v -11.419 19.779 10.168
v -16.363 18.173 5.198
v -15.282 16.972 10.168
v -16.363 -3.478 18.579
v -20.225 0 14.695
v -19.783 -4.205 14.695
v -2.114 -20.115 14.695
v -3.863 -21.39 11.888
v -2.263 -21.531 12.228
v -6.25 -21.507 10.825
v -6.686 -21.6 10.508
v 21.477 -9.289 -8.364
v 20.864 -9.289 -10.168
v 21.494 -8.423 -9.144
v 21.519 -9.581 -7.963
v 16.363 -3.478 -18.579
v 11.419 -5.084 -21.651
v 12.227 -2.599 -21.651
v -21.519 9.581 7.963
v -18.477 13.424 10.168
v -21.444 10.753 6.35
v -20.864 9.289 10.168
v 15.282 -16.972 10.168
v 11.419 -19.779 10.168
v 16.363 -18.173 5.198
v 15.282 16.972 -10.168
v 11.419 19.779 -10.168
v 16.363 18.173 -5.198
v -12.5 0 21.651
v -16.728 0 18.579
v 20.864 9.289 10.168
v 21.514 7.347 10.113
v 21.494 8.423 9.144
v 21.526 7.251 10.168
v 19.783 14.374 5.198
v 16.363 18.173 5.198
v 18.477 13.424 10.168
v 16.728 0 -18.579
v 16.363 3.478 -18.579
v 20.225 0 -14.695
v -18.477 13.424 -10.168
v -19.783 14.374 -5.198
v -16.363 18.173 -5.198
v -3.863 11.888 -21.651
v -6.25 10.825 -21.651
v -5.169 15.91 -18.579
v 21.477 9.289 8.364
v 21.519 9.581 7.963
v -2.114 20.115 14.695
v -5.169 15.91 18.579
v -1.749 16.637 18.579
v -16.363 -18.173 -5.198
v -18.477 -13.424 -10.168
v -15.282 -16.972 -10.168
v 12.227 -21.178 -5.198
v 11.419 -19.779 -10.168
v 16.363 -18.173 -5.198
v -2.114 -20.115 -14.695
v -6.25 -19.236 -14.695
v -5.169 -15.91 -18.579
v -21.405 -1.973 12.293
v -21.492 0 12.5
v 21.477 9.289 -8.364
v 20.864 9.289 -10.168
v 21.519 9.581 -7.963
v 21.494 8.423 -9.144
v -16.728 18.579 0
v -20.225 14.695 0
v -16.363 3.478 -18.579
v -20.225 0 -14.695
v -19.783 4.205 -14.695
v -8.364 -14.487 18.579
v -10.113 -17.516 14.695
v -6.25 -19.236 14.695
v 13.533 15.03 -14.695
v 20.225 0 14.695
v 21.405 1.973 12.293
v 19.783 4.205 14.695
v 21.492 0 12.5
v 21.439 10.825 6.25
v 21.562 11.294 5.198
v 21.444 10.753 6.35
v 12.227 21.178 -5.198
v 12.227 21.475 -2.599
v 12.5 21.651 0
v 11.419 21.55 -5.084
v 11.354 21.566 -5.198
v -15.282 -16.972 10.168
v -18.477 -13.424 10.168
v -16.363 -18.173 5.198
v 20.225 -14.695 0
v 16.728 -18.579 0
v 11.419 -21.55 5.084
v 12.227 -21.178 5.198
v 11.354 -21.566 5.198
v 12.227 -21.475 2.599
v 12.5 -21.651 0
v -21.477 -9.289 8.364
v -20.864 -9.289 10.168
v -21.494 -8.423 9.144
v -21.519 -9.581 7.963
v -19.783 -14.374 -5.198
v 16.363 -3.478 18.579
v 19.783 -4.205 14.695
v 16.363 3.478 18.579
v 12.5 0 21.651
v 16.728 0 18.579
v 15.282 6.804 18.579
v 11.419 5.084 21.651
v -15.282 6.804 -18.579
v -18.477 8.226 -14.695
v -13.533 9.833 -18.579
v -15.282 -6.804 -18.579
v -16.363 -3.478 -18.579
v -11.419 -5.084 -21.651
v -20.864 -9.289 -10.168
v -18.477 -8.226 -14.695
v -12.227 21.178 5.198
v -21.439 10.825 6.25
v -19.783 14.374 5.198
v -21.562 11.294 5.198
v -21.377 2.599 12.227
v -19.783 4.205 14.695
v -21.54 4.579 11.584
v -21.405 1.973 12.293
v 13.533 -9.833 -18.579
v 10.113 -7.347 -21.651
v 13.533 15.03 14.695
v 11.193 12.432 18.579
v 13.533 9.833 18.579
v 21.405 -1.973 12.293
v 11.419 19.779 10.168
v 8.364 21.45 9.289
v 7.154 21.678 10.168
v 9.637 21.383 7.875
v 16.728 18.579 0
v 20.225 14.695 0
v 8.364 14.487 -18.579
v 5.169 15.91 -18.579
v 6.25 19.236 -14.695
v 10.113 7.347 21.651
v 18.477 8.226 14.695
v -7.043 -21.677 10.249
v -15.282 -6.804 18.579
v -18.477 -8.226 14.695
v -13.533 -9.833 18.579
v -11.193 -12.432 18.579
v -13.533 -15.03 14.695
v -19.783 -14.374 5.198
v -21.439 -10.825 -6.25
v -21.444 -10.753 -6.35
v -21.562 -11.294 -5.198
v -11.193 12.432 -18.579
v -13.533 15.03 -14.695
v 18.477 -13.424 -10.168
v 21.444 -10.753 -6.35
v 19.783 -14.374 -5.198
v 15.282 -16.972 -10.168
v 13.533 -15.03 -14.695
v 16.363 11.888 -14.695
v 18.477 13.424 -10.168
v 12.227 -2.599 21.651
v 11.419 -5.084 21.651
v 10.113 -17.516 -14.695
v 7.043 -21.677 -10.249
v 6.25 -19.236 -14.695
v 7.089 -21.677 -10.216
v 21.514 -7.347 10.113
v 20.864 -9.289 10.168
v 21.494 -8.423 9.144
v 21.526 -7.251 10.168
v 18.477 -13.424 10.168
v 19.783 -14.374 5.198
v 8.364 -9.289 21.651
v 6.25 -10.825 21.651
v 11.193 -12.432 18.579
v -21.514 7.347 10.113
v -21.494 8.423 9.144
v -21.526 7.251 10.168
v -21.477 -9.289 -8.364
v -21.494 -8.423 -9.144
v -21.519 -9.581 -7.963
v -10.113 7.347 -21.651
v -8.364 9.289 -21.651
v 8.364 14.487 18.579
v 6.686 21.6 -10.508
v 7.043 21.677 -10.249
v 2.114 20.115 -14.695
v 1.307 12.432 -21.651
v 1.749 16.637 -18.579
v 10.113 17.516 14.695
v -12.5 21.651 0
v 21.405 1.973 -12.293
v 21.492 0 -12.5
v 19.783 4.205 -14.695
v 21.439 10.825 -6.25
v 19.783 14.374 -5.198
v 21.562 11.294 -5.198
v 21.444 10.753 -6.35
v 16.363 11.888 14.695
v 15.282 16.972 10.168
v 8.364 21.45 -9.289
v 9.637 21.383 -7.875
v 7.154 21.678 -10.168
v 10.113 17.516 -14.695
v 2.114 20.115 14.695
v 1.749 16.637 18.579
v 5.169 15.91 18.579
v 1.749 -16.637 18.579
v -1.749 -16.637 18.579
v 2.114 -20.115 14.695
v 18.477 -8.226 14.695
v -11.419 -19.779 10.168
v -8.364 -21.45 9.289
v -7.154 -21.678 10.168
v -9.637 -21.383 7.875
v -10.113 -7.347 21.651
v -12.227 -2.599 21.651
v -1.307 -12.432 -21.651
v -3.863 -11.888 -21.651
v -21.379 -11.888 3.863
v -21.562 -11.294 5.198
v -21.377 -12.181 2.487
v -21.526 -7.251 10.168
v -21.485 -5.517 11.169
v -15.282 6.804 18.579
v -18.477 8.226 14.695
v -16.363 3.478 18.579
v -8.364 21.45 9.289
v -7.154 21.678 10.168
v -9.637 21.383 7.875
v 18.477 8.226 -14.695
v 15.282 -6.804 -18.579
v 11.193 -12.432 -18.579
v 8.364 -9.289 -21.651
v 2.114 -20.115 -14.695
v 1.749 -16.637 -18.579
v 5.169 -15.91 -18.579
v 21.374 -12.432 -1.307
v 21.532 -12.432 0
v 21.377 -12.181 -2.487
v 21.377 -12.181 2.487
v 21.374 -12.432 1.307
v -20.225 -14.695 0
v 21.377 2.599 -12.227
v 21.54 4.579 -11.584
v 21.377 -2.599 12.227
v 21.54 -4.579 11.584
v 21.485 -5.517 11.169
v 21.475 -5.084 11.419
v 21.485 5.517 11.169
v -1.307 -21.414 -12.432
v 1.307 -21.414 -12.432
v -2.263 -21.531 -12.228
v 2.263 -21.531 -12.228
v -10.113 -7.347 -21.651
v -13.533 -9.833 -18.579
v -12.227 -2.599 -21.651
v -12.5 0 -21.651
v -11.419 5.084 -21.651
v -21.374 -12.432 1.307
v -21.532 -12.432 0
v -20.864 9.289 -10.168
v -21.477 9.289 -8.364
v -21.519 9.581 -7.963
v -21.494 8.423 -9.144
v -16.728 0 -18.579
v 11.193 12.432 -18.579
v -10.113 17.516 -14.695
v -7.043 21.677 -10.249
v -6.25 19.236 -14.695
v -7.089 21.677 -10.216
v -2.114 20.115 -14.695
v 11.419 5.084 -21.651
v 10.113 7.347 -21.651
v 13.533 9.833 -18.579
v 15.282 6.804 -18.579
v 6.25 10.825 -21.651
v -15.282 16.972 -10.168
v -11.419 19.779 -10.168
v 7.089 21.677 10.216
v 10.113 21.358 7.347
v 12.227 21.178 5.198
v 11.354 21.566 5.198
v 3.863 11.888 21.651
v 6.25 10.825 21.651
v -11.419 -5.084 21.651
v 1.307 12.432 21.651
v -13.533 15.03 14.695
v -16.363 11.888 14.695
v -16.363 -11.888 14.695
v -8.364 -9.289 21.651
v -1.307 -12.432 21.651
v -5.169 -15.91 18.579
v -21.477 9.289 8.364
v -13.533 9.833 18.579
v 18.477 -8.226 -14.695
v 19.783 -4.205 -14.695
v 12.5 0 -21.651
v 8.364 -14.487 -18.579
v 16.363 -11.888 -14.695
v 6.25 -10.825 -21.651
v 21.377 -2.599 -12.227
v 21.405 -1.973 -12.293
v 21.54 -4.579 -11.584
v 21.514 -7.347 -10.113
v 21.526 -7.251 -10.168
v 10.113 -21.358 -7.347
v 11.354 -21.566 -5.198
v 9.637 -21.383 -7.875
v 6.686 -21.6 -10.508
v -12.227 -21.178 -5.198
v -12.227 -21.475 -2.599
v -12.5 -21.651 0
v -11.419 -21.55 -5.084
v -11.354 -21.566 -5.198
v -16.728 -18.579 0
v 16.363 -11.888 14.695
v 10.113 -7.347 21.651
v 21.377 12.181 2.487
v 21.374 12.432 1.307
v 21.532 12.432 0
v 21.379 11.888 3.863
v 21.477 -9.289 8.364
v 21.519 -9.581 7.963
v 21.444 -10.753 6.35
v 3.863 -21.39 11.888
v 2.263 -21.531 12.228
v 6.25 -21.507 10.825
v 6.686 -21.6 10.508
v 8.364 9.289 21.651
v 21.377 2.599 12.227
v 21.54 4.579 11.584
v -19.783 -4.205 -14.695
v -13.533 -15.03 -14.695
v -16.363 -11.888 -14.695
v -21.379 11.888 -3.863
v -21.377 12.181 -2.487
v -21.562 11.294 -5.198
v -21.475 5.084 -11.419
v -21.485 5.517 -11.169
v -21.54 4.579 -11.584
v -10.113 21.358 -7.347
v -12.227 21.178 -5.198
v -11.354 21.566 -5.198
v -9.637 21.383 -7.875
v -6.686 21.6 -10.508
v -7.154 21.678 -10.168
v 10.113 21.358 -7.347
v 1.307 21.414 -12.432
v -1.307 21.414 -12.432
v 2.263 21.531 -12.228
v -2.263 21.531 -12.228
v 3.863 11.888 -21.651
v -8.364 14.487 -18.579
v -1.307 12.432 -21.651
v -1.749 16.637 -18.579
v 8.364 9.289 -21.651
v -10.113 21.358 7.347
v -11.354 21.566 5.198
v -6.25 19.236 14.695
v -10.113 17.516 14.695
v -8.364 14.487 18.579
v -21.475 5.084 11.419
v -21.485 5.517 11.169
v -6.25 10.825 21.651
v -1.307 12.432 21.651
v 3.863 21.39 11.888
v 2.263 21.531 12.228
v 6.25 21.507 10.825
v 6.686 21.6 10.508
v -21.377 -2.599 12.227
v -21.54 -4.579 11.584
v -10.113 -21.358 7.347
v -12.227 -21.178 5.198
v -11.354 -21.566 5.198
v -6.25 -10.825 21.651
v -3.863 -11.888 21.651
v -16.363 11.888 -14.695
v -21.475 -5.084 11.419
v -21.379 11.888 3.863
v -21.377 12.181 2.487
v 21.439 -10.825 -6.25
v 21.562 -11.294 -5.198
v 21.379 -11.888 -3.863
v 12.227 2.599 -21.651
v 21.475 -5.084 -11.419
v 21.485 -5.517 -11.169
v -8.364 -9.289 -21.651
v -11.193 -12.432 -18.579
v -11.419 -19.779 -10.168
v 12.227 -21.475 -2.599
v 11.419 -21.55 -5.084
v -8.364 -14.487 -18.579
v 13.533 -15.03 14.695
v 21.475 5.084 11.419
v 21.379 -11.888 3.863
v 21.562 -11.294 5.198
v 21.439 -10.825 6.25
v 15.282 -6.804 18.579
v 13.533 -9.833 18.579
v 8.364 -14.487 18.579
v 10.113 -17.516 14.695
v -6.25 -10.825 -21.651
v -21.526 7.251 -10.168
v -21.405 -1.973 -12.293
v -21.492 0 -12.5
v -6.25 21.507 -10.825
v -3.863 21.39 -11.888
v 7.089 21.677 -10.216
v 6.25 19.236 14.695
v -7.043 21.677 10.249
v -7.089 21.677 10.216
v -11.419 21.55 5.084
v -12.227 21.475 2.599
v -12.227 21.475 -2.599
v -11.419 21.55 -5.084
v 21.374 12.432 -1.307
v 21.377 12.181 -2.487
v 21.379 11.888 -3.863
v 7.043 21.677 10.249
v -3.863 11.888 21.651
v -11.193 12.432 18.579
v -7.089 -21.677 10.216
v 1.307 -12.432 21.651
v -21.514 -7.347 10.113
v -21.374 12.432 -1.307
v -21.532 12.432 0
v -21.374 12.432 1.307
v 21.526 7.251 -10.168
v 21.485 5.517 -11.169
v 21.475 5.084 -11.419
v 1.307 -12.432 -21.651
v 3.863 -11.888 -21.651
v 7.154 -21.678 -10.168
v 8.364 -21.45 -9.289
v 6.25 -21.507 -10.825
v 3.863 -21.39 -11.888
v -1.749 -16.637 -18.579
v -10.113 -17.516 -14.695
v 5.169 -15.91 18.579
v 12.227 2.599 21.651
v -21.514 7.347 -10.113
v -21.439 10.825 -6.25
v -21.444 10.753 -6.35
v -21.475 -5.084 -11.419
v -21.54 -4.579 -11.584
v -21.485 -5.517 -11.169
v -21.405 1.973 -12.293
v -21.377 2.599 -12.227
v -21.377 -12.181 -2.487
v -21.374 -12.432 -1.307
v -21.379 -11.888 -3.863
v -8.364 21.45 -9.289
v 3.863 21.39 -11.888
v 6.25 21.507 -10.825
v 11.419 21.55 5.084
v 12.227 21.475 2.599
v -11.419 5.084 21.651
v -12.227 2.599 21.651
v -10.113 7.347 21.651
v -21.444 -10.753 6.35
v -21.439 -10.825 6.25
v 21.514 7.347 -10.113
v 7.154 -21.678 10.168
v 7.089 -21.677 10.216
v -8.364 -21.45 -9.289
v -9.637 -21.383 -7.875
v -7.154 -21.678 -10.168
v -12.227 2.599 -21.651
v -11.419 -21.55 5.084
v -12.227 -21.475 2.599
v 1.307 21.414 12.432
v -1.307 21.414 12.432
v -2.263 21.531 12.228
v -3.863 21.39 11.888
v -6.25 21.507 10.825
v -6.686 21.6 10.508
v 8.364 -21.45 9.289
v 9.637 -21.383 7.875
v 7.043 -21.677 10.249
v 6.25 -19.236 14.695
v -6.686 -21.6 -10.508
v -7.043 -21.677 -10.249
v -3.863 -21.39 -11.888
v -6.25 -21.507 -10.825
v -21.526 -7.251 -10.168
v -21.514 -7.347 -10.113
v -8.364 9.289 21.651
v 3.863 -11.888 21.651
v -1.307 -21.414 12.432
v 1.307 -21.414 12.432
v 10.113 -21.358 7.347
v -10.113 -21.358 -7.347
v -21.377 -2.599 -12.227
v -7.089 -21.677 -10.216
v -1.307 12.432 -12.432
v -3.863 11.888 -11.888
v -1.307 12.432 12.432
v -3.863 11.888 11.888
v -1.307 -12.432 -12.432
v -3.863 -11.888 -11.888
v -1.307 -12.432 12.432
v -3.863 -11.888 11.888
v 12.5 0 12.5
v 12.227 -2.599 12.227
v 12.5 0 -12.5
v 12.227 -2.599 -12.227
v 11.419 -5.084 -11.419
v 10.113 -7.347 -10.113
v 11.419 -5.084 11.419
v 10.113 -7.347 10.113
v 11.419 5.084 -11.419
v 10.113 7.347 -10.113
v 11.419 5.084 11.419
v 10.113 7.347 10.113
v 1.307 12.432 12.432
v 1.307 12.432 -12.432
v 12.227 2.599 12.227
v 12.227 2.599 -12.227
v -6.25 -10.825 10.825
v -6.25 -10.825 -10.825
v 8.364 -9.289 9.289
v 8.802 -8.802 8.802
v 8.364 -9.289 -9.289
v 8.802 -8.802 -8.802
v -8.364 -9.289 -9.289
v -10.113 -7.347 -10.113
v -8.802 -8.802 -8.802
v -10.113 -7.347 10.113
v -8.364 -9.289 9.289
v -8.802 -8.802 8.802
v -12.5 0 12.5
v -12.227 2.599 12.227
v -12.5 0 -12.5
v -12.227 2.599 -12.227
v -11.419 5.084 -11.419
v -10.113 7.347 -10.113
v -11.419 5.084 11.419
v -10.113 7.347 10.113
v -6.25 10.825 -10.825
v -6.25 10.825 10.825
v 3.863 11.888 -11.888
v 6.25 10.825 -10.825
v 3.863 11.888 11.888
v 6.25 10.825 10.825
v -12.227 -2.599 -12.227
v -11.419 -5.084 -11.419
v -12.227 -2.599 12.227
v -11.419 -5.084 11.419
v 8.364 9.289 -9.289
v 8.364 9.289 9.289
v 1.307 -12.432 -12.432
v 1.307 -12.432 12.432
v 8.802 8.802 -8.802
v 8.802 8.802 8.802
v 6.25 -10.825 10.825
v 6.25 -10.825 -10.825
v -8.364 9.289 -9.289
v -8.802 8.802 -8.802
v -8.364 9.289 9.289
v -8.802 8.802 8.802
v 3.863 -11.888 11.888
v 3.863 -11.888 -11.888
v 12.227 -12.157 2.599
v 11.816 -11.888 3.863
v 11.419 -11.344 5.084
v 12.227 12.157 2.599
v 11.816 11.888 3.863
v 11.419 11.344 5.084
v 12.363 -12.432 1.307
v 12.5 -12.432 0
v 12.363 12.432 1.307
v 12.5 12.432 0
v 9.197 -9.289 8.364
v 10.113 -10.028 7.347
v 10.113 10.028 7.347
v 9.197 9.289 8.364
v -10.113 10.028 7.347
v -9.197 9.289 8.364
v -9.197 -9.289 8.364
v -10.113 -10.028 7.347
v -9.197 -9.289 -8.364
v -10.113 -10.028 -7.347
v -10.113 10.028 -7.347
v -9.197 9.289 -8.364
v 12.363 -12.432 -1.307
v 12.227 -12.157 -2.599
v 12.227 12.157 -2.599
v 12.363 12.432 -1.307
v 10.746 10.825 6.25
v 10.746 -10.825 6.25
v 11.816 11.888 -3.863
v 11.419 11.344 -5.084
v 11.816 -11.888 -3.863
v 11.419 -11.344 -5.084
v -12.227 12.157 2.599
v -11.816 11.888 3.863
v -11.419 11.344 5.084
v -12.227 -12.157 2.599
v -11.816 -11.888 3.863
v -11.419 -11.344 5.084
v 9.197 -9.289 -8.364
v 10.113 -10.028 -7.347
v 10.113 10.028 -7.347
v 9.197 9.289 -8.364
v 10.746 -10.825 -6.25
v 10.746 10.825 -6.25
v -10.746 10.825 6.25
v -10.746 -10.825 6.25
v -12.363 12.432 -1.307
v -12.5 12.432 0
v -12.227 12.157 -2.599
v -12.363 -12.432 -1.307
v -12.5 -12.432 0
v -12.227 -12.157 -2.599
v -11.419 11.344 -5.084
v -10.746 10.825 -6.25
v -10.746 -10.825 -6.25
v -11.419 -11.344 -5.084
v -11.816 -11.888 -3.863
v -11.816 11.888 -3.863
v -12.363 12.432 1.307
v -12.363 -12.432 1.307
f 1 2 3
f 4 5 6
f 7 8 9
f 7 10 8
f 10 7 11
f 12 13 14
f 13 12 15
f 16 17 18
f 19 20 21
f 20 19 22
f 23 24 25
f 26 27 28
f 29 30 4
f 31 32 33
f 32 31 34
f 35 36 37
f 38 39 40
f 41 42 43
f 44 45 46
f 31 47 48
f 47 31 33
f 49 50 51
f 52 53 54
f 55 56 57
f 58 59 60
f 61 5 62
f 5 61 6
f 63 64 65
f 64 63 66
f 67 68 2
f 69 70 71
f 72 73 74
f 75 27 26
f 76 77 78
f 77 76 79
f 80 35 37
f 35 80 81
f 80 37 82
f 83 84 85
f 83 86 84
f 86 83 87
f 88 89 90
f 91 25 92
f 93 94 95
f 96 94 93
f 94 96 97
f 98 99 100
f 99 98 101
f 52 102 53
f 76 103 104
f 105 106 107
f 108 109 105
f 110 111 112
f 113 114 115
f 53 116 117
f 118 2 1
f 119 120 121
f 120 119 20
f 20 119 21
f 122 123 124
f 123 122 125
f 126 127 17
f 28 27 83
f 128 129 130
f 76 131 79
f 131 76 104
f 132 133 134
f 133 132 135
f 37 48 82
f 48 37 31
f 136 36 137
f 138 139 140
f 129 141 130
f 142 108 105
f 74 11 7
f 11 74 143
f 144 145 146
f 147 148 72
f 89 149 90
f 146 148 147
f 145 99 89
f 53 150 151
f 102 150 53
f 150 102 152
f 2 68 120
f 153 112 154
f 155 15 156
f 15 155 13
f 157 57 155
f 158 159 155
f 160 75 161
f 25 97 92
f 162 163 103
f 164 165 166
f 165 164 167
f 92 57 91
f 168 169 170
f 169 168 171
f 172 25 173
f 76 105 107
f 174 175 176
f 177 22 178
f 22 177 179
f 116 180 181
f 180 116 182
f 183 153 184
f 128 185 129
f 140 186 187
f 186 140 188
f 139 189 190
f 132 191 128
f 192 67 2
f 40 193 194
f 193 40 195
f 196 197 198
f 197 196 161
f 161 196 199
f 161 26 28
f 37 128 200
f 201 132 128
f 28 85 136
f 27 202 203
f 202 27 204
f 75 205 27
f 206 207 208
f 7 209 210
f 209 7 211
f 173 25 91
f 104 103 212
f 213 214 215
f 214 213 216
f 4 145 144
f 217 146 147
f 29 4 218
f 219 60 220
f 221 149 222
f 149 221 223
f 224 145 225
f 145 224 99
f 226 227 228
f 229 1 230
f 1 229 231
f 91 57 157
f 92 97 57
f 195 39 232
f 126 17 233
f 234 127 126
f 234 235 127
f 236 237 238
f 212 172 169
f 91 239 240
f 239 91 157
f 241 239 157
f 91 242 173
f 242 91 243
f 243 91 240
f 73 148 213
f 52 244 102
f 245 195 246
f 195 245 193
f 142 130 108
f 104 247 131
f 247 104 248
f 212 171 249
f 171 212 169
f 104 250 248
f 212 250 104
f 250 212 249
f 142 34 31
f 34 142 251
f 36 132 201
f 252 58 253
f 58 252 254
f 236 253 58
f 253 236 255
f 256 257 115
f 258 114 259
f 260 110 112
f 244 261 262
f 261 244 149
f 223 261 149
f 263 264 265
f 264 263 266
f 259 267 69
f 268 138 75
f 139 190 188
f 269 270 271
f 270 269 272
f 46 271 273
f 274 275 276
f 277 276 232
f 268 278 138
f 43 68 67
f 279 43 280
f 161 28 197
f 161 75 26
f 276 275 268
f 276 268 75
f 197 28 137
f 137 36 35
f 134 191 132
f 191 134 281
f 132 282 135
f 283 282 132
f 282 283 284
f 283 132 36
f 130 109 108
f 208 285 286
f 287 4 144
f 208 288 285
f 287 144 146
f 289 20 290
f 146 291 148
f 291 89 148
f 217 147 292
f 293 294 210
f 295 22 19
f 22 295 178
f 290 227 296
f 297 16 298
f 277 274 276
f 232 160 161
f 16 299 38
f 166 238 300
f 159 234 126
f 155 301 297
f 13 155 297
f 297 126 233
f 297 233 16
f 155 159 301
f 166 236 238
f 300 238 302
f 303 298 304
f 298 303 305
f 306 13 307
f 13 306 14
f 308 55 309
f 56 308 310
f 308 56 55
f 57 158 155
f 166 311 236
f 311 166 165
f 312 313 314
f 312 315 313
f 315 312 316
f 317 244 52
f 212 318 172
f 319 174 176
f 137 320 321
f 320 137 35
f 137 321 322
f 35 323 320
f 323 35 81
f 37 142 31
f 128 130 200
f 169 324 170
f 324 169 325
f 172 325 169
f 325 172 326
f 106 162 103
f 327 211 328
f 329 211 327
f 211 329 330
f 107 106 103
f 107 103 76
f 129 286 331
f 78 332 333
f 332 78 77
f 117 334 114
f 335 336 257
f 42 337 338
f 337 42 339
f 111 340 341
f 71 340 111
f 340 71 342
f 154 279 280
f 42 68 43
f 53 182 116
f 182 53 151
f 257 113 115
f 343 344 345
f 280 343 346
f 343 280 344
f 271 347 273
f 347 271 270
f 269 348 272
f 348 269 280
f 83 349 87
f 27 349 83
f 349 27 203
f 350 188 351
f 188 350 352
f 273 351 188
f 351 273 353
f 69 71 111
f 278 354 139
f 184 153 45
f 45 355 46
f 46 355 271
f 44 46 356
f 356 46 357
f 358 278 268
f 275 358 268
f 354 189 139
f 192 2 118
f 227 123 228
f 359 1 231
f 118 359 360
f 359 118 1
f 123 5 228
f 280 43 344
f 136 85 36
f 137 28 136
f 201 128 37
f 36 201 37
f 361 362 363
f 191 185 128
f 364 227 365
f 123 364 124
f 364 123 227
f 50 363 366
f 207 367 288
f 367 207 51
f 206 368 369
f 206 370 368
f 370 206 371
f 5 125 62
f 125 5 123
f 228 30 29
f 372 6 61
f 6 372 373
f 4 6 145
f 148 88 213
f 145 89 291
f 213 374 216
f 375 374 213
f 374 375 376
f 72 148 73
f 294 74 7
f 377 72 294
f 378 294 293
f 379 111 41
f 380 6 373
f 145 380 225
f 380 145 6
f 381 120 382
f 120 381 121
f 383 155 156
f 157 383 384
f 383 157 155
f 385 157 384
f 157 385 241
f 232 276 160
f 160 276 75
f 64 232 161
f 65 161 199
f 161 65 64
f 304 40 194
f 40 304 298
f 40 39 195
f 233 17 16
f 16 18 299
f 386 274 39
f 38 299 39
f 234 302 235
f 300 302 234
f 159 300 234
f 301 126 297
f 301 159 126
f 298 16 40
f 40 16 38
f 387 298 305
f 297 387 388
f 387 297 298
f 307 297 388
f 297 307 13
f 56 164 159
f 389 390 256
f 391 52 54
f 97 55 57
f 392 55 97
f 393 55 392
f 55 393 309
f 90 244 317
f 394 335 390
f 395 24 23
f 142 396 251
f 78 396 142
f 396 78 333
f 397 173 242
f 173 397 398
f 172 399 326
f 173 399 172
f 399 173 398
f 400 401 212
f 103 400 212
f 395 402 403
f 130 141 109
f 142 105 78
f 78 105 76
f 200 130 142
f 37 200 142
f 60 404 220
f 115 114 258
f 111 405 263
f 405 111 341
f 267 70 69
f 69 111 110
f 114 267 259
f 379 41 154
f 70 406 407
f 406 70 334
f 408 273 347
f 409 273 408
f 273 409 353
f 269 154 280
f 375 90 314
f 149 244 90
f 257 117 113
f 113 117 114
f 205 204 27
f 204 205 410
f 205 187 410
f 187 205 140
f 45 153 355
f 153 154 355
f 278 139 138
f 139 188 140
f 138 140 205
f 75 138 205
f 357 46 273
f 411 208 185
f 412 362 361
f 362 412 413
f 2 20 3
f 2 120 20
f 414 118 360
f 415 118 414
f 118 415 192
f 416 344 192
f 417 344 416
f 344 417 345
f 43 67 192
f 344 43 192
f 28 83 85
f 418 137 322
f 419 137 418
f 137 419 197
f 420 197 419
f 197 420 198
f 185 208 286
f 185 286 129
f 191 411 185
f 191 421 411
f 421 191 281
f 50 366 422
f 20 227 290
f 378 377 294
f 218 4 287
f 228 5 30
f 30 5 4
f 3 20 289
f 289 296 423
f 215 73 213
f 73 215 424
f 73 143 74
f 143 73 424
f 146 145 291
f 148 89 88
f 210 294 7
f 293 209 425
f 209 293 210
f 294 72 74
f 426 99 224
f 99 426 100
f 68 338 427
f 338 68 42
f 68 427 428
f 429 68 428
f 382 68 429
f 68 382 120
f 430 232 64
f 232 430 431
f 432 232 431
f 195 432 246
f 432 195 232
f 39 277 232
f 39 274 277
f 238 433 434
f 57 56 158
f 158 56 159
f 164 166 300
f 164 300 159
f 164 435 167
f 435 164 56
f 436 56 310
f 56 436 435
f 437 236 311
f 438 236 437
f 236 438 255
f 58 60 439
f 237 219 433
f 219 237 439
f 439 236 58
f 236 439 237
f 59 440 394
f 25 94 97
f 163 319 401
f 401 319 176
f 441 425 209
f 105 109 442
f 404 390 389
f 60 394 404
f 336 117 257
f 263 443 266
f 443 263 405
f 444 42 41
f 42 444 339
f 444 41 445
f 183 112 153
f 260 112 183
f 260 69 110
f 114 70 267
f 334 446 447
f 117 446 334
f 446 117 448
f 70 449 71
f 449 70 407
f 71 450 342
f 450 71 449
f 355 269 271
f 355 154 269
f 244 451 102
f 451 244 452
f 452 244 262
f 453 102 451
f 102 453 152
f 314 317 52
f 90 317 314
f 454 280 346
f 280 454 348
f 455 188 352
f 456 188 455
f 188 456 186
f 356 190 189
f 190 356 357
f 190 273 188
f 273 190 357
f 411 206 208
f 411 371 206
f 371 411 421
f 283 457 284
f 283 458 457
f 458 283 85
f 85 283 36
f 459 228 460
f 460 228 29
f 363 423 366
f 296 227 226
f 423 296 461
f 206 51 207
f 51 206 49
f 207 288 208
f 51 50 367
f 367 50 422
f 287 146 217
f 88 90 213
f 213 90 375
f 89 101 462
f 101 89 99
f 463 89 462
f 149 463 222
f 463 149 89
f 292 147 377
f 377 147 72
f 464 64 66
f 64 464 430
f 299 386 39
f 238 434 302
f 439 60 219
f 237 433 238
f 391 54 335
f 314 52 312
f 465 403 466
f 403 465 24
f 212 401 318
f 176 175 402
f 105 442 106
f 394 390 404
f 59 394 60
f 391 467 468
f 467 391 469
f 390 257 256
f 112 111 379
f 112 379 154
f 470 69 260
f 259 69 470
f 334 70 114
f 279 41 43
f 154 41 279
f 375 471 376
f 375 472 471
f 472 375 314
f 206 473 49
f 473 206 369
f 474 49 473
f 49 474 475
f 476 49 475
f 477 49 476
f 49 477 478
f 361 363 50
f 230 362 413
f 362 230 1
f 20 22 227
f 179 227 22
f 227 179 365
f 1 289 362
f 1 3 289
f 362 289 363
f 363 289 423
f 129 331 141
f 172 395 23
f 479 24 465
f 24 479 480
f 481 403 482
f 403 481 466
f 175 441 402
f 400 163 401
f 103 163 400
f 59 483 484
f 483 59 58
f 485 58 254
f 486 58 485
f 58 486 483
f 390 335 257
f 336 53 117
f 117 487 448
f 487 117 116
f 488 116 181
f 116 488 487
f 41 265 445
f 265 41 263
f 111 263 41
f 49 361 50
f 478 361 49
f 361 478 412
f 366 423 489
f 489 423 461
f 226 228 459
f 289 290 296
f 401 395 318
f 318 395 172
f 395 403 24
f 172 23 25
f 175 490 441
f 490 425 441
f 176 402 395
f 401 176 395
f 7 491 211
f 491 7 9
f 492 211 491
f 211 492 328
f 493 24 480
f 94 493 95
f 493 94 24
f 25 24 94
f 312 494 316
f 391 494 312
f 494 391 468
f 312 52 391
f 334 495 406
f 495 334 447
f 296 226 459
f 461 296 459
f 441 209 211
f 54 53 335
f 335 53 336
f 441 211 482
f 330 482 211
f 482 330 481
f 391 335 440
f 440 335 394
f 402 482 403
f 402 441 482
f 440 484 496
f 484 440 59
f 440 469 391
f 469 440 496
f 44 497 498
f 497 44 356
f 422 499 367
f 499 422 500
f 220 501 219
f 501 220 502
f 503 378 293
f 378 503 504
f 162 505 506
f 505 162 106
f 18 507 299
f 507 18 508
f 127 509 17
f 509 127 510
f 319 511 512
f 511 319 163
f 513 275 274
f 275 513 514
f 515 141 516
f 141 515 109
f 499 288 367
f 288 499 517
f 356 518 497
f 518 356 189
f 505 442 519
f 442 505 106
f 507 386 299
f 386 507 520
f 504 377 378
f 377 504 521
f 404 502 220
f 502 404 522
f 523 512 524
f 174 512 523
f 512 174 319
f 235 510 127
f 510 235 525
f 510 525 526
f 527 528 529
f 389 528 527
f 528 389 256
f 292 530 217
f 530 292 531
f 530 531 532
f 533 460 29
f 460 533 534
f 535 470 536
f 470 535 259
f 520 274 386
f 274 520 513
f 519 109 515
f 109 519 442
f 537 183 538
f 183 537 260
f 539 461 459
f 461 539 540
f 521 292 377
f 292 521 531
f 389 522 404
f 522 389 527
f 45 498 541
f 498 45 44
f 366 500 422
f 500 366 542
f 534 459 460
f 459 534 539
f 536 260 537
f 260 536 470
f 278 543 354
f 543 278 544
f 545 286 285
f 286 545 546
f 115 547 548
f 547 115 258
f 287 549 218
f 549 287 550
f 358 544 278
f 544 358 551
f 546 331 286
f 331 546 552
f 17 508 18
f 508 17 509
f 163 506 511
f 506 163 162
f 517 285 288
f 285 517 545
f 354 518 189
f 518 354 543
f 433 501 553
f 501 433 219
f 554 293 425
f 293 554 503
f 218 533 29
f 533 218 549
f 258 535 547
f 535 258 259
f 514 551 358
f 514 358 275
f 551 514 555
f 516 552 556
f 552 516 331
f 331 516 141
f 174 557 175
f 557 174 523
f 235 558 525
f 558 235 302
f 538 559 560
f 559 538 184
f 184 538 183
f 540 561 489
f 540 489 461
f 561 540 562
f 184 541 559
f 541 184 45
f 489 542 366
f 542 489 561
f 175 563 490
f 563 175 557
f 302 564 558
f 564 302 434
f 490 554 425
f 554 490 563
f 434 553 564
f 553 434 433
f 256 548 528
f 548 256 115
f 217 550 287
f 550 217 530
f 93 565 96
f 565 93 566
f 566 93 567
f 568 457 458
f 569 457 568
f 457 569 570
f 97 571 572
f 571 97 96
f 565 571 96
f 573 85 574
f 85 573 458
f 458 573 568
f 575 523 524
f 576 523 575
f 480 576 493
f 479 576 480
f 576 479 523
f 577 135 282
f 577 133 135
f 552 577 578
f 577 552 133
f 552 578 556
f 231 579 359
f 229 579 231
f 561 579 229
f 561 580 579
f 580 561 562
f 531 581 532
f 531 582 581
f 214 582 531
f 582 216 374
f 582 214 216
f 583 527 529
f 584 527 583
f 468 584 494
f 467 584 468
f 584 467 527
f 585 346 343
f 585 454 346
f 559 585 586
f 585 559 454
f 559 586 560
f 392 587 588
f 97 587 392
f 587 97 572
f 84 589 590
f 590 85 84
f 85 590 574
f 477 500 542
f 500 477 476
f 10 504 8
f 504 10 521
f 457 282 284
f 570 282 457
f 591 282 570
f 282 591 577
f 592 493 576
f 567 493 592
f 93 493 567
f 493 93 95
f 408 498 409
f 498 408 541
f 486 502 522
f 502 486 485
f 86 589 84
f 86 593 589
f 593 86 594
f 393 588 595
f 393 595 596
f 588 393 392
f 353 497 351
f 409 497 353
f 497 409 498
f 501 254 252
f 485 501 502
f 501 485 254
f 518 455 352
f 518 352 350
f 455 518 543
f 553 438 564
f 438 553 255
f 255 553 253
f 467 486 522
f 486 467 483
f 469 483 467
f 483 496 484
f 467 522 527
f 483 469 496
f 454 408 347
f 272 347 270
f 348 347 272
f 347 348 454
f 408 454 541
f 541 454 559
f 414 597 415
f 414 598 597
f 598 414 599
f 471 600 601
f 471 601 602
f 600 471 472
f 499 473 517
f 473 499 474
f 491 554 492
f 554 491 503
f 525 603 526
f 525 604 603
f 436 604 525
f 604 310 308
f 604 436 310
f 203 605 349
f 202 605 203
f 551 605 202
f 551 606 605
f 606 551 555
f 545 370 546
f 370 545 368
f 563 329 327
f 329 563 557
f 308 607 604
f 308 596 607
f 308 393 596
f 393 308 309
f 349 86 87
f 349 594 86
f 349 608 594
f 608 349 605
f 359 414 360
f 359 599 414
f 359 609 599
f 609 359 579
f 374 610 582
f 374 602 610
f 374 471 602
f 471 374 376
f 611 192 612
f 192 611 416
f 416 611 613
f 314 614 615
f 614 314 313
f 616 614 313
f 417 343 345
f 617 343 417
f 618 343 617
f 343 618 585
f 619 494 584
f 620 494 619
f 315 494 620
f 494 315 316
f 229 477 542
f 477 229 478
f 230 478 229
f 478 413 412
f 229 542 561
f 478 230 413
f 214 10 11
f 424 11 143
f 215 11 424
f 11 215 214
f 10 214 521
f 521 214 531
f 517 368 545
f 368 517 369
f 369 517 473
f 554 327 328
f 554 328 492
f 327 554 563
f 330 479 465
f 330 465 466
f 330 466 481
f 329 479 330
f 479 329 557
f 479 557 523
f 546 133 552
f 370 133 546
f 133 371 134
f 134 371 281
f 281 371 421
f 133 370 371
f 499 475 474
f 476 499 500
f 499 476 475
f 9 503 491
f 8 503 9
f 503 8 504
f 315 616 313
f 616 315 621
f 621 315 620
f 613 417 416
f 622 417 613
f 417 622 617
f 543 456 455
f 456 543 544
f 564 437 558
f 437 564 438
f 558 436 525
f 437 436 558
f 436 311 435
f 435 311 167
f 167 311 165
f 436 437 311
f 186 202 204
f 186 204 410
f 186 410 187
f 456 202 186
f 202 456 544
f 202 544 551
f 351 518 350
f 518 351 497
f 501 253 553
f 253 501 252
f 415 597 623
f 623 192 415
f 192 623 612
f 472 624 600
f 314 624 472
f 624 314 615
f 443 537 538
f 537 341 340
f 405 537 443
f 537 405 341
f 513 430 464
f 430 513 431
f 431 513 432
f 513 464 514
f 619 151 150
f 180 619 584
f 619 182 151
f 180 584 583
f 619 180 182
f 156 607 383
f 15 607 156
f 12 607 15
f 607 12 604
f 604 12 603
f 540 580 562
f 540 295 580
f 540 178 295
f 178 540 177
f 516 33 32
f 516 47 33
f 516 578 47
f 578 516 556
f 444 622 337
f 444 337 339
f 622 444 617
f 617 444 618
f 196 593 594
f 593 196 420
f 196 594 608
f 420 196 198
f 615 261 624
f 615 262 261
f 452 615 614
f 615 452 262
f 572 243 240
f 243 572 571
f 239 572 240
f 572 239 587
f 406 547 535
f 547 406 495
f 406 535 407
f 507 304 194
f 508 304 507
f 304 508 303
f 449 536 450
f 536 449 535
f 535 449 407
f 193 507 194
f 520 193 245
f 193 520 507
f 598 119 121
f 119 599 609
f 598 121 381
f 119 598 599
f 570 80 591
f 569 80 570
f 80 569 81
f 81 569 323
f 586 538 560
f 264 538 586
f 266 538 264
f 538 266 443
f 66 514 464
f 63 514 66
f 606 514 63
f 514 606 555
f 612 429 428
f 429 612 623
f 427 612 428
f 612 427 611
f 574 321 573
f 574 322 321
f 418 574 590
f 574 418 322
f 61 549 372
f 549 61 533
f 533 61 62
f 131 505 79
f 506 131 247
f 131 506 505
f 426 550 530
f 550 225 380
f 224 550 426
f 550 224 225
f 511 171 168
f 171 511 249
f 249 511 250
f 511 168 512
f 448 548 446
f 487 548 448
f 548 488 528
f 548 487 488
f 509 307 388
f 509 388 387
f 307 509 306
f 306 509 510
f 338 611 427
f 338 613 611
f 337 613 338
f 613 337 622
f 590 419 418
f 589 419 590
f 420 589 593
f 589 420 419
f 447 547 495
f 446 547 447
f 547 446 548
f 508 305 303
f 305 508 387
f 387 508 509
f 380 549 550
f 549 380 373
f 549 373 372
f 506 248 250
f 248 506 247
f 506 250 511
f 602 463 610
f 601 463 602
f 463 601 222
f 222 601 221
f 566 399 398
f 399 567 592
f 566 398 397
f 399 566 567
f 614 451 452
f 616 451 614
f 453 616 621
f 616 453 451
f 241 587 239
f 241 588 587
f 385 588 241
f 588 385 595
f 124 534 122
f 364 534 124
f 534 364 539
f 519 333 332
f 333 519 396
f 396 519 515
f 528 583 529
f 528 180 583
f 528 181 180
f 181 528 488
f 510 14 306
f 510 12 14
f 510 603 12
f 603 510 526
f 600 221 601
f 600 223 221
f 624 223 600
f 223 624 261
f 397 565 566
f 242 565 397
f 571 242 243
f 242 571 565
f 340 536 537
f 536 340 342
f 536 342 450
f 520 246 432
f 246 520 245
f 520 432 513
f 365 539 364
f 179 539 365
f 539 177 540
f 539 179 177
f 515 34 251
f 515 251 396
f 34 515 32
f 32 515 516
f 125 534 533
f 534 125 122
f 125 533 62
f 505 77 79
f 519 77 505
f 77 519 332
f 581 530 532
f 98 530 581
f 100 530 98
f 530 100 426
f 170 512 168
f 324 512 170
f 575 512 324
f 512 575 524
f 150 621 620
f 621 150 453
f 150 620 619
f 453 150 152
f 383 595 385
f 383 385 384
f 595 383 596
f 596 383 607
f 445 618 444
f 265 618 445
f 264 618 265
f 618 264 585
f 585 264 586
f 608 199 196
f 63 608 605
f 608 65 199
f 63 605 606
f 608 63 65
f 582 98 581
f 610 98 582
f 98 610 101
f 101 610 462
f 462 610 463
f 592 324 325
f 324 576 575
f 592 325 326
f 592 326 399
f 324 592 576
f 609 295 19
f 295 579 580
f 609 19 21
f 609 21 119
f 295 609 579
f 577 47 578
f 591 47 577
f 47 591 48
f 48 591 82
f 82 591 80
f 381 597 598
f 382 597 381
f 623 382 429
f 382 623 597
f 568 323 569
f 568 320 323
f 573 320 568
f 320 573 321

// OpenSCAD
size = 50;
hole = 25;

function r_from_dia(d) = d / 2;

cy_r = r_from_dia(hole);
cy_h = r_from_dia(size * 2.5);

module rotcy(rot, r, h) {
    rotate(90, rot)
      cylinder(r = r, h = h, center = true);
}

//rotcy(0, 100, 40)

difference() {
    sphere(r = r_from_dia(size));
    rotcy([0, 0, 0], cy_r, cy_h);
    rotcy([1, 0, 0], cy_r, cy_h);
    rotcy([0, 1, 0], cy_r, cy_h);
}
